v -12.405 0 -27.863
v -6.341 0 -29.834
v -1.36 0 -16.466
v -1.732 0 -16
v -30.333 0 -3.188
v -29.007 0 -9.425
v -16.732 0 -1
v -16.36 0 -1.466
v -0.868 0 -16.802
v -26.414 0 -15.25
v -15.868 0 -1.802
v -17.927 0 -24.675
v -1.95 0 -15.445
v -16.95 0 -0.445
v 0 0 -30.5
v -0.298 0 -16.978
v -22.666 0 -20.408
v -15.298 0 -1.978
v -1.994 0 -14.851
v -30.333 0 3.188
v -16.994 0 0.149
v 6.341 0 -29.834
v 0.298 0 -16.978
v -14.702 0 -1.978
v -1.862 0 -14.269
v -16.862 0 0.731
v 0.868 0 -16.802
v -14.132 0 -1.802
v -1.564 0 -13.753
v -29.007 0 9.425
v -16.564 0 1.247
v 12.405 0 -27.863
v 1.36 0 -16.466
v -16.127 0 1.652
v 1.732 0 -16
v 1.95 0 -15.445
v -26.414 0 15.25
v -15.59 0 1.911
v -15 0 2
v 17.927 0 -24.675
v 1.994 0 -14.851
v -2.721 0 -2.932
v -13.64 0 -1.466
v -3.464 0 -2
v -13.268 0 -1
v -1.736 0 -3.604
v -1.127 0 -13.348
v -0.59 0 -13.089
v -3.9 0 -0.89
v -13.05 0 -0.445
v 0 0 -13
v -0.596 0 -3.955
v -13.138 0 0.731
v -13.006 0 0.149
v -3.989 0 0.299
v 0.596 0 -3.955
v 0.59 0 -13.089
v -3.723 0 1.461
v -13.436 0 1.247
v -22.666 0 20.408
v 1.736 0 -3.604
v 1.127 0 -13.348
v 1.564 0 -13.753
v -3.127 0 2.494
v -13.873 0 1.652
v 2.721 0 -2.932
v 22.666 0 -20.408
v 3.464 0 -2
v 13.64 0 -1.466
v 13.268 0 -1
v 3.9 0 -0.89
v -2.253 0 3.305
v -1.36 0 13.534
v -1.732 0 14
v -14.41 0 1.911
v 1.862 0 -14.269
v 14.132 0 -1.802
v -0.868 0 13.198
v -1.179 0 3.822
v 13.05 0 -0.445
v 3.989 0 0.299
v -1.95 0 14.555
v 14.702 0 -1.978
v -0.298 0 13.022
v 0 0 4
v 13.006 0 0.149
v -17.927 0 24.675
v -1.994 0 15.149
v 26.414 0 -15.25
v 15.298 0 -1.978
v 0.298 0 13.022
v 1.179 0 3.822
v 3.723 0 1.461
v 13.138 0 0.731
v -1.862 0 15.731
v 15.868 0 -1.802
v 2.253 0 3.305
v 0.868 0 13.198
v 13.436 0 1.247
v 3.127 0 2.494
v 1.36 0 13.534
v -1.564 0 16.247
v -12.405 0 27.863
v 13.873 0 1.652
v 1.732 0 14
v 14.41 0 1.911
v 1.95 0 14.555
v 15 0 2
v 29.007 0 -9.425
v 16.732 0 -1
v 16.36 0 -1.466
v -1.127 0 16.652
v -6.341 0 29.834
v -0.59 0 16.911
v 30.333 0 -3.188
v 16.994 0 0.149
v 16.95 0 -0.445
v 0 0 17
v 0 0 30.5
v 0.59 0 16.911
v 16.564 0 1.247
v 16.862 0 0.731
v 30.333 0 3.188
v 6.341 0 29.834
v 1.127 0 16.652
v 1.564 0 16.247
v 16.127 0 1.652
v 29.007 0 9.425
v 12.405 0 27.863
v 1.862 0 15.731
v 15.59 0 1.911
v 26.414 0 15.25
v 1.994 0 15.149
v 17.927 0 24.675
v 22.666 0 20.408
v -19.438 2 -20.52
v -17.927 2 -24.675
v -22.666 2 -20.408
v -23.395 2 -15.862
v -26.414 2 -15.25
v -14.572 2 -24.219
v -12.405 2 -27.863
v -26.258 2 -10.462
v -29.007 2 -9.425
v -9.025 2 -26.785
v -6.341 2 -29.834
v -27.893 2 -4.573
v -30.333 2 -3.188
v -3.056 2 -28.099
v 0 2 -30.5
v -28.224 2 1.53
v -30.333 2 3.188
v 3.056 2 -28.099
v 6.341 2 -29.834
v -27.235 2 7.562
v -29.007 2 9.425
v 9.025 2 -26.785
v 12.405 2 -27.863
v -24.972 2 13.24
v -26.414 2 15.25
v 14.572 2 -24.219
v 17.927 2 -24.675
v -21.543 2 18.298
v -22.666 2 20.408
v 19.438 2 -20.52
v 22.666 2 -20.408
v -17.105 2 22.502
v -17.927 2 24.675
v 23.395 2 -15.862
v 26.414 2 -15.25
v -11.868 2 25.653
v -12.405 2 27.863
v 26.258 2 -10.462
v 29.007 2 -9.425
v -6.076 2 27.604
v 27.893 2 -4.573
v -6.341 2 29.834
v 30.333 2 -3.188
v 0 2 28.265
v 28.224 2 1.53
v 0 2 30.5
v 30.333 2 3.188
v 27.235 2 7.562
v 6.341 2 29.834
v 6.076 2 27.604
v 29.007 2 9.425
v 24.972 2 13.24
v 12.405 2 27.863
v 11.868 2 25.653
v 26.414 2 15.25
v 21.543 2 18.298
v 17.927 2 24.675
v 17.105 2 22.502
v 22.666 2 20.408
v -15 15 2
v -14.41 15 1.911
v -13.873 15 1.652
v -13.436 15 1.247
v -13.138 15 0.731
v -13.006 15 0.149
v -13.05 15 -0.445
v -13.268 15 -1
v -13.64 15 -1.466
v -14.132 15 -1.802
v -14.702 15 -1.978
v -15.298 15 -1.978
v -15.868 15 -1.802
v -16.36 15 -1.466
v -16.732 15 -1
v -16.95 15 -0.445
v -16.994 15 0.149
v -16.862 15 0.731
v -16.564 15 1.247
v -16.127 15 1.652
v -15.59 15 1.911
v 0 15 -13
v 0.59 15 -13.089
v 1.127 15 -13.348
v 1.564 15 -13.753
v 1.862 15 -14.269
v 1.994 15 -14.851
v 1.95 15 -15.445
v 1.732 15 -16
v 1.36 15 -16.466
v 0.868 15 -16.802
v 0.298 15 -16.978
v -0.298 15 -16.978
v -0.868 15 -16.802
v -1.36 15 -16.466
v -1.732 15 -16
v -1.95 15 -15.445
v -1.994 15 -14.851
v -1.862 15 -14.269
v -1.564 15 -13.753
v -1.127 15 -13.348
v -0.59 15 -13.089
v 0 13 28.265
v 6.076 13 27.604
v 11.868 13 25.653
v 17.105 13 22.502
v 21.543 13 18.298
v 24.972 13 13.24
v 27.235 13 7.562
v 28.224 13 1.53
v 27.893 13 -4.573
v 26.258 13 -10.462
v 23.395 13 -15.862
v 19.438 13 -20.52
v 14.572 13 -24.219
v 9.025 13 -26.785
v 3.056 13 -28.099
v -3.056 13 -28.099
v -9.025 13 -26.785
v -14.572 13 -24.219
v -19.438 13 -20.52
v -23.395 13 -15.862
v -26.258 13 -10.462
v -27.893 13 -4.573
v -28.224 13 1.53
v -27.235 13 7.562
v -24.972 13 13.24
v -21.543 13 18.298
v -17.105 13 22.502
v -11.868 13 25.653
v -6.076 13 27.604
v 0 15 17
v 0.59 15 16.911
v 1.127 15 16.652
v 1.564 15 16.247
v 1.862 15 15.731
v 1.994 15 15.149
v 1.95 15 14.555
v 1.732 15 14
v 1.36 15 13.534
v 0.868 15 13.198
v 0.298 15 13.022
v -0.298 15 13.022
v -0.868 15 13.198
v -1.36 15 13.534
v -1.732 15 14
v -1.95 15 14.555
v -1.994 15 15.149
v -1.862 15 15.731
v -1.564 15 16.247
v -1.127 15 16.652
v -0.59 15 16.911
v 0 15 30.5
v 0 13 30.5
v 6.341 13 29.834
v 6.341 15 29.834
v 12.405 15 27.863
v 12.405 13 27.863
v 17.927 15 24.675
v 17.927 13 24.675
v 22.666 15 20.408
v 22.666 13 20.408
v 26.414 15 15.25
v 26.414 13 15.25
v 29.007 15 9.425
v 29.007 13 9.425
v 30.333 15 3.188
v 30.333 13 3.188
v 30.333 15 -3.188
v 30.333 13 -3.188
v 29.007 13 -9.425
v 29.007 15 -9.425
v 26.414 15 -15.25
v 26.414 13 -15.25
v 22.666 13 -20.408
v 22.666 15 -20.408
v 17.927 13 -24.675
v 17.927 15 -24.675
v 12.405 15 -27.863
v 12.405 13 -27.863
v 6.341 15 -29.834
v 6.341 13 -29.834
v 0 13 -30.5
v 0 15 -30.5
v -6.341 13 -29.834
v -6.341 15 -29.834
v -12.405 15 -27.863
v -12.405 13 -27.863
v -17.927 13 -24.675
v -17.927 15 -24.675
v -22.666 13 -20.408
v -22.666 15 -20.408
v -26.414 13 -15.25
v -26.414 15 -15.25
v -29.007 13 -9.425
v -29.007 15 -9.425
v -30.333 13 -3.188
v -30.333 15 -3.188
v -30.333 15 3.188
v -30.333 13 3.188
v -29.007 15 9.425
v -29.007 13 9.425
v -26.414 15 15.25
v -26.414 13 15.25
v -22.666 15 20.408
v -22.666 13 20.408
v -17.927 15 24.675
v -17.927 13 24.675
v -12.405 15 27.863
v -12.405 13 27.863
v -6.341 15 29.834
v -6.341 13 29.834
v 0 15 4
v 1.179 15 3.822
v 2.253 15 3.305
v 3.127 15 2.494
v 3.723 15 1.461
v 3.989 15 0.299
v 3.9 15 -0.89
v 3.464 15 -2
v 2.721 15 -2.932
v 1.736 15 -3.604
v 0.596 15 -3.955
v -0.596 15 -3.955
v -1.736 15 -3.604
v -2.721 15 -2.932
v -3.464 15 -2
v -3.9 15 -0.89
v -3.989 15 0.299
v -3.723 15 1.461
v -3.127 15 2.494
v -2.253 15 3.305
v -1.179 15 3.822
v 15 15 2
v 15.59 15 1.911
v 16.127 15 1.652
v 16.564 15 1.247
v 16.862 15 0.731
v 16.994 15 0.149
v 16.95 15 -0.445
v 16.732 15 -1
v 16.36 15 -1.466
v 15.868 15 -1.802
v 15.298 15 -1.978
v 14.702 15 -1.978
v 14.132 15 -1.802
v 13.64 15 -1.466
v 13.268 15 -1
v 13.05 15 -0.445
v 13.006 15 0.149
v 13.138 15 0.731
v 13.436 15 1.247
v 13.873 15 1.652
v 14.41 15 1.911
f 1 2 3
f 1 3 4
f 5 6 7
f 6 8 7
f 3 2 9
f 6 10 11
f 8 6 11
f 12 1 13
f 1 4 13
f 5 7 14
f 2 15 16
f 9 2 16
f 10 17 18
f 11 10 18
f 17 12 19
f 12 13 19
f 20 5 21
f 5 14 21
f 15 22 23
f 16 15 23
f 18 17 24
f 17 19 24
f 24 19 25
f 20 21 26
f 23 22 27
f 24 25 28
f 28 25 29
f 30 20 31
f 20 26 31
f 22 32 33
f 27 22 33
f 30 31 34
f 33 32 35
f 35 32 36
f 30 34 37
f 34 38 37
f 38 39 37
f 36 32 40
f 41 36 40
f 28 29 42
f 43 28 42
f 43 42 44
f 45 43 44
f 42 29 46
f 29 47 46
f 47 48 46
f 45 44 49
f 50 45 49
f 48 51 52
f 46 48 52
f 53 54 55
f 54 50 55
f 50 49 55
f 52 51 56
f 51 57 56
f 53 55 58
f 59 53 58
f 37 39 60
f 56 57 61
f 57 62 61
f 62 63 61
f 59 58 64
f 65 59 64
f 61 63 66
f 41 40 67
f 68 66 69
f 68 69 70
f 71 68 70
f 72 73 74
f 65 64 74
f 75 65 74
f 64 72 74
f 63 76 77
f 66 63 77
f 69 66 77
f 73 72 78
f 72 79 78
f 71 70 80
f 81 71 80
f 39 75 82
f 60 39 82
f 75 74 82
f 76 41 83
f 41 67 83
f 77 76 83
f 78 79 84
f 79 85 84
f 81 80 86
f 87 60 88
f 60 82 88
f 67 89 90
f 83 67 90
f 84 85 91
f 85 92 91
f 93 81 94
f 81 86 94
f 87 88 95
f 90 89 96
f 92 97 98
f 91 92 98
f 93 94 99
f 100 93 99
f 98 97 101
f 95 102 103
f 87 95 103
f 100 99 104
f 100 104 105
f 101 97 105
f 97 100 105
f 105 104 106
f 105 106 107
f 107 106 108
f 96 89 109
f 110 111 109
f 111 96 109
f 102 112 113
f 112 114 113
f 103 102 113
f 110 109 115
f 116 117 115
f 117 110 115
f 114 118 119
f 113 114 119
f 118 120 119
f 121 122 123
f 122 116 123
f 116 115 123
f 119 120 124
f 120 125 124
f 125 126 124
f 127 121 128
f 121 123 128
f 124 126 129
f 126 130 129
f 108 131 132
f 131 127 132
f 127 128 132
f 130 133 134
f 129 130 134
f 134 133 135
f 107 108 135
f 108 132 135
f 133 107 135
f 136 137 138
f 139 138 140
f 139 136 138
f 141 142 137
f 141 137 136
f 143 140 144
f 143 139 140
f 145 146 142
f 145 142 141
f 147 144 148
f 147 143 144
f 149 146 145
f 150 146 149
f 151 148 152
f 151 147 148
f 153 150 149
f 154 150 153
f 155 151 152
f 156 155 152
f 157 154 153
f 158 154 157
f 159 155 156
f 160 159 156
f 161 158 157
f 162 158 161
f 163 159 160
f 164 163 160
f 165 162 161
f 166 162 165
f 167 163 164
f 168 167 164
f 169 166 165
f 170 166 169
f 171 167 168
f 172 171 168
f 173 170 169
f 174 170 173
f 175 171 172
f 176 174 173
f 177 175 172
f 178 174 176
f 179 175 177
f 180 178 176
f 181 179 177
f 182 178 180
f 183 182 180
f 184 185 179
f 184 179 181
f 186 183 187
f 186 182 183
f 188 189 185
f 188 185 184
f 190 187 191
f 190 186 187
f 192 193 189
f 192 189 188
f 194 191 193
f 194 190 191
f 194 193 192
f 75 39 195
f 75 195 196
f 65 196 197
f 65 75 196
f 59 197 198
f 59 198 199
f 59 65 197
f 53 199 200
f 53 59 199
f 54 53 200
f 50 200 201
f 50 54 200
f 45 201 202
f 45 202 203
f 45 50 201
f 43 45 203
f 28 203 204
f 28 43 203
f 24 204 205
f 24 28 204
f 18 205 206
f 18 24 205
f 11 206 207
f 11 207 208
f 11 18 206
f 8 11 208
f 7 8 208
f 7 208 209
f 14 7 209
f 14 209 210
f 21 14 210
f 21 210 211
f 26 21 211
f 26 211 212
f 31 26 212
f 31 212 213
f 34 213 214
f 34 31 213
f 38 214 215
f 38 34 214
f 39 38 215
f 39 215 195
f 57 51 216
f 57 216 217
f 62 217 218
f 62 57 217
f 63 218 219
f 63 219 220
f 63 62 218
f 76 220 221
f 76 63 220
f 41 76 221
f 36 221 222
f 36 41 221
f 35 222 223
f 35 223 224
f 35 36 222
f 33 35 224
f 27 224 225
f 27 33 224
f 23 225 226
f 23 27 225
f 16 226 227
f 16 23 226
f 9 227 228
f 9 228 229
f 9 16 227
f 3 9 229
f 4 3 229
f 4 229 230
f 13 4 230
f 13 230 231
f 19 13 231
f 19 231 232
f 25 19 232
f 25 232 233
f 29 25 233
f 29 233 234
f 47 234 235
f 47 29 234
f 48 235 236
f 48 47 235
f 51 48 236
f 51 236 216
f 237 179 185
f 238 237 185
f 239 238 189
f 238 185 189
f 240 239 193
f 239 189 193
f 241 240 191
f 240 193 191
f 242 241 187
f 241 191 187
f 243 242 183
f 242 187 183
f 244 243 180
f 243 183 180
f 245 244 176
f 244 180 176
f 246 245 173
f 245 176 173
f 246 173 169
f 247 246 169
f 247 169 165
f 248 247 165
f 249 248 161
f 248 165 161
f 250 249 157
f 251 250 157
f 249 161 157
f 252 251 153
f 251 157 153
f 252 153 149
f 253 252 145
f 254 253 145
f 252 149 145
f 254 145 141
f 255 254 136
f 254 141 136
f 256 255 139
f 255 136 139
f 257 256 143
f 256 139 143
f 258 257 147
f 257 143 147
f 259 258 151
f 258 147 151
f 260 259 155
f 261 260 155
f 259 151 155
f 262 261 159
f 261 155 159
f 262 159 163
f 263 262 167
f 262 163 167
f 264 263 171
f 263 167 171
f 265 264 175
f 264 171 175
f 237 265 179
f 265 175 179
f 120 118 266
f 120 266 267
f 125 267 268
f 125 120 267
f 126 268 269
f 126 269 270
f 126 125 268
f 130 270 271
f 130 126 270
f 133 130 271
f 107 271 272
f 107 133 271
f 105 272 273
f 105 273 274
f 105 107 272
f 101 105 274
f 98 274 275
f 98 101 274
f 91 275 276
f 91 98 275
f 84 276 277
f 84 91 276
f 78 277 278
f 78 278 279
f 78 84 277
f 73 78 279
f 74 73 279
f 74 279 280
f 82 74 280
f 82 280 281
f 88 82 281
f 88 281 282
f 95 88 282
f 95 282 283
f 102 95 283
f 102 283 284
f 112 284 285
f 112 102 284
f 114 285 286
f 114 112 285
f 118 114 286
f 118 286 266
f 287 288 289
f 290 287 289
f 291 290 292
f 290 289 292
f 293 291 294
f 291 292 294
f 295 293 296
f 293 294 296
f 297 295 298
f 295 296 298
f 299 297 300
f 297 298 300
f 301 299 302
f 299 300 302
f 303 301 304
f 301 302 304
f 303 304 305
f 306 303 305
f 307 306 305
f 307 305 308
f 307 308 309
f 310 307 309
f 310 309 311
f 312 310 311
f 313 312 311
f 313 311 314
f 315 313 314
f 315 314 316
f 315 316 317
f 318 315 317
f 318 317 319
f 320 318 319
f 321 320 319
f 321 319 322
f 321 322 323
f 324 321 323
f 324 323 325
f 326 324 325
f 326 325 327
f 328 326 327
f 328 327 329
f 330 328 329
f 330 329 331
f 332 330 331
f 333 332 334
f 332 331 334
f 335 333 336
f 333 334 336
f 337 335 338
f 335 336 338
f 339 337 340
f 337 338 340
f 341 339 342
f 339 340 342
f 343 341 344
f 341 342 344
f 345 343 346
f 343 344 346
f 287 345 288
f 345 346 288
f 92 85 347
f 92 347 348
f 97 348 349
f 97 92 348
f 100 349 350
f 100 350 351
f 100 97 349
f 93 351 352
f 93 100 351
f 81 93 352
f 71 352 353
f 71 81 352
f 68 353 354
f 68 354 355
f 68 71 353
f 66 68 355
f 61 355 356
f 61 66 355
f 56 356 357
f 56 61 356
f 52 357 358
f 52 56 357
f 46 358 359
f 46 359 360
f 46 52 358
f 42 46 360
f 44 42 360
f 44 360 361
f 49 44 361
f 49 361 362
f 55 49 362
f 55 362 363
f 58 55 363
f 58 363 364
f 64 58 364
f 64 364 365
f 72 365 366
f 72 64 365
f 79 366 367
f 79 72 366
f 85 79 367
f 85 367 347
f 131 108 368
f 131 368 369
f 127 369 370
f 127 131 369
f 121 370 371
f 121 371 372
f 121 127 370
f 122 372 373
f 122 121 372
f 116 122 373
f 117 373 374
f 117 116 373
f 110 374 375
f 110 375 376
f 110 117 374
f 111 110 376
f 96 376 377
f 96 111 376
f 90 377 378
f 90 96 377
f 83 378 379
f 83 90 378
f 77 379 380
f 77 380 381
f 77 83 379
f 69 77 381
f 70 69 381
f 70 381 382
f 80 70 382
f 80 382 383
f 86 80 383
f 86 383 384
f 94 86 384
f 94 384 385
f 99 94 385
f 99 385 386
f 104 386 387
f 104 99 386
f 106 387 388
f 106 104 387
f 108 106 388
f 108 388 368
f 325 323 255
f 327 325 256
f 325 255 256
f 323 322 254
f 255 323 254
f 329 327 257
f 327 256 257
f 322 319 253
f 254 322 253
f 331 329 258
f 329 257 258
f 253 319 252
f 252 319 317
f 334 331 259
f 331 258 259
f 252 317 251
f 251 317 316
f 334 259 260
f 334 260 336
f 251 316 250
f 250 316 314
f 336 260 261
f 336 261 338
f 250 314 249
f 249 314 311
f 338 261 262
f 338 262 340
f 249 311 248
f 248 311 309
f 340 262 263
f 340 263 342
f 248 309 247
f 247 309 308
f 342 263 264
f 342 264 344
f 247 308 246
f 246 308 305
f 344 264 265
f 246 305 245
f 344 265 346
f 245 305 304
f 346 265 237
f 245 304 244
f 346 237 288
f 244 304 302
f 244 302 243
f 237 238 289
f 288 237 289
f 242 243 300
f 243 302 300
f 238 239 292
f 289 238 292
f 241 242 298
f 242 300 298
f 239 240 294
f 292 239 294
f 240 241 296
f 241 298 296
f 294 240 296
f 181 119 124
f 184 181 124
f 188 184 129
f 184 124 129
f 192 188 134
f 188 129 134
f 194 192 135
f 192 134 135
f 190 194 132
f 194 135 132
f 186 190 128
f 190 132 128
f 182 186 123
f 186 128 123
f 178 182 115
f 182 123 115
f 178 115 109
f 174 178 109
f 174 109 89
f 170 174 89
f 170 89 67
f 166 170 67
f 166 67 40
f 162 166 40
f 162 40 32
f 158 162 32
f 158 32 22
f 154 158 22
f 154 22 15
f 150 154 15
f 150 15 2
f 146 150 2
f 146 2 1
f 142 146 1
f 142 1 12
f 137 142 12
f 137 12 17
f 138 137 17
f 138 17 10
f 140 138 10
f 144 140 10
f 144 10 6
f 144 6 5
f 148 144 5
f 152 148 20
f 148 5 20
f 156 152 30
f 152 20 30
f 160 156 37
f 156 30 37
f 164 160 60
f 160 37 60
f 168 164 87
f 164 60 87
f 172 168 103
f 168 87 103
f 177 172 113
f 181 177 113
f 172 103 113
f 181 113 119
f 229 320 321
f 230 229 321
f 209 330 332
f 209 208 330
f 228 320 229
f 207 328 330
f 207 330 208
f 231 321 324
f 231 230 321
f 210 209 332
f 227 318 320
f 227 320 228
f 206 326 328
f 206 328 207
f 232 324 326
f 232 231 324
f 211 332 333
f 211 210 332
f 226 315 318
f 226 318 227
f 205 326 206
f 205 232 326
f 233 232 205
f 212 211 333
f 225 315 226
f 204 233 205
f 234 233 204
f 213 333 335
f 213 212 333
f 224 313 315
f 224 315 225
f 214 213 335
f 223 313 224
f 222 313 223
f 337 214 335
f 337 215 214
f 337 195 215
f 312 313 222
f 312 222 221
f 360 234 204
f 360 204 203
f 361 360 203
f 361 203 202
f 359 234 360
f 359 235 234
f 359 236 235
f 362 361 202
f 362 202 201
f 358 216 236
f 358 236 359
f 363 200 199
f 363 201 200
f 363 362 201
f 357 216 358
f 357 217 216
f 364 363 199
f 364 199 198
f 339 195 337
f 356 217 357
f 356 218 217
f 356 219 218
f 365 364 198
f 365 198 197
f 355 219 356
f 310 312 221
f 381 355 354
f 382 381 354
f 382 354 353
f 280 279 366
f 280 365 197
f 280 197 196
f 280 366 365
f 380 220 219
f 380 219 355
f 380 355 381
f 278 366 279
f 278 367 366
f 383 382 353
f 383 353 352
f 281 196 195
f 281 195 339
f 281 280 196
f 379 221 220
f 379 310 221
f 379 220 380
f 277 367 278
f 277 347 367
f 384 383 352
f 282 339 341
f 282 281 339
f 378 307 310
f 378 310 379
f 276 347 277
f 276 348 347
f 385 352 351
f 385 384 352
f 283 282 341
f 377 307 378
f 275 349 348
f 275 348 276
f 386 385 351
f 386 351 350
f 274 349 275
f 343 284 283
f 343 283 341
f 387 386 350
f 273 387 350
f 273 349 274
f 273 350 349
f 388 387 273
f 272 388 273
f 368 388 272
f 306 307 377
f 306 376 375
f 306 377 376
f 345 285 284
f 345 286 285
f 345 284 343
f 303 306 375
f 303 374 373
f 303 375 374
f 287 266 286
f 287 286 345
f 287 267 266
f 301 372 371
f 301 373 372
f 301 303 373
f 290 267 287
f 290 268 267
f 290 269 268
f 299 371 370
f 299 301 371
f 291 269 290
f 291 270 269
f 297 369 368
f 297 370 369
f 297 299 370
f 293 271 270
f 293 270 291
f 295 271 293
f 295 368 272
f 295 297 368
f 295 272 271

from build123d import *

# Parameters (mm, degrees)
SKETCH_1_R          = 30.5
SKETCH_1_R_2        = 4
SKETCH_1_R_3        = 2
EXTRUDE_1_DEPTH     = 15
CUT_EXTRUDE_START   = 2
SKETCH_2_R          = 30.5
SKETCH_2_R_2        = 28.265
CUT_EXTRUDE_1_DEPTH = 11


with BuildPart() as part:
    # 草图1 → 凸台-拉伸1 (new body)
    with BuildSketch(Plane(origin=(0, 0, 0), x_dir=(1, 0, 0), z_dir=(0, 1, 0))):
        with Locations(Location((0, 0, 0), (0, 0, 270))):
            Circle(SKETCH_1_R)
        with Locations(Location((0, 0, 0), (0, 0, 270))):
            Circle(SKETCH_1_R_2, mode=Mode.SUBTRACT)
        with Locations(Location((0, 15, 0), (0, 0, 270))):
            Circle(SKETCH_1_R_3, mode=Mode.SUBTRACT)
        with Locations(Location((15, 0, 0), (0, 0, 270))):
            Circle(SKETCH_1_R_3, mode=Mode.SUBTRACT)
        with Locations(Location((0, -15, 0), (0, 0, 270))):
            Circle(SKETCH_1_R_3, mode=Mode.SUBTRACT)
        with Locations(Location((-15, 0, 0), (0, 0, 270))):
            Circle(SKETCH_1_R_3, mode=Mode.SUBTRACT)
    extrude(amount=EXTRUDE_1_DEPTH)

    # 草图2 → 切除-拉伸1 (cut)
    with BuildSketch(Plane(origin=(0, 0, 0), x_dir=(1, 0, 0), z_dir=(0, 1, 0)).offset(CUT_EXTRUDE_START)):
        with Locations(Location((0, 0, 0), (0, 0, 270))):
            Circle(SKETCH_2_R)
        with Locations(Location((0, 0, 0), (0, 0, 270))):
            Circle(SKETCH_2_R_2, mode=Mode.SUBTRACT)
    extrude(amount=CUT_EXTRUDE_1_DEPTH, mode=Mode.SUBTRACT)


solid = part.part
